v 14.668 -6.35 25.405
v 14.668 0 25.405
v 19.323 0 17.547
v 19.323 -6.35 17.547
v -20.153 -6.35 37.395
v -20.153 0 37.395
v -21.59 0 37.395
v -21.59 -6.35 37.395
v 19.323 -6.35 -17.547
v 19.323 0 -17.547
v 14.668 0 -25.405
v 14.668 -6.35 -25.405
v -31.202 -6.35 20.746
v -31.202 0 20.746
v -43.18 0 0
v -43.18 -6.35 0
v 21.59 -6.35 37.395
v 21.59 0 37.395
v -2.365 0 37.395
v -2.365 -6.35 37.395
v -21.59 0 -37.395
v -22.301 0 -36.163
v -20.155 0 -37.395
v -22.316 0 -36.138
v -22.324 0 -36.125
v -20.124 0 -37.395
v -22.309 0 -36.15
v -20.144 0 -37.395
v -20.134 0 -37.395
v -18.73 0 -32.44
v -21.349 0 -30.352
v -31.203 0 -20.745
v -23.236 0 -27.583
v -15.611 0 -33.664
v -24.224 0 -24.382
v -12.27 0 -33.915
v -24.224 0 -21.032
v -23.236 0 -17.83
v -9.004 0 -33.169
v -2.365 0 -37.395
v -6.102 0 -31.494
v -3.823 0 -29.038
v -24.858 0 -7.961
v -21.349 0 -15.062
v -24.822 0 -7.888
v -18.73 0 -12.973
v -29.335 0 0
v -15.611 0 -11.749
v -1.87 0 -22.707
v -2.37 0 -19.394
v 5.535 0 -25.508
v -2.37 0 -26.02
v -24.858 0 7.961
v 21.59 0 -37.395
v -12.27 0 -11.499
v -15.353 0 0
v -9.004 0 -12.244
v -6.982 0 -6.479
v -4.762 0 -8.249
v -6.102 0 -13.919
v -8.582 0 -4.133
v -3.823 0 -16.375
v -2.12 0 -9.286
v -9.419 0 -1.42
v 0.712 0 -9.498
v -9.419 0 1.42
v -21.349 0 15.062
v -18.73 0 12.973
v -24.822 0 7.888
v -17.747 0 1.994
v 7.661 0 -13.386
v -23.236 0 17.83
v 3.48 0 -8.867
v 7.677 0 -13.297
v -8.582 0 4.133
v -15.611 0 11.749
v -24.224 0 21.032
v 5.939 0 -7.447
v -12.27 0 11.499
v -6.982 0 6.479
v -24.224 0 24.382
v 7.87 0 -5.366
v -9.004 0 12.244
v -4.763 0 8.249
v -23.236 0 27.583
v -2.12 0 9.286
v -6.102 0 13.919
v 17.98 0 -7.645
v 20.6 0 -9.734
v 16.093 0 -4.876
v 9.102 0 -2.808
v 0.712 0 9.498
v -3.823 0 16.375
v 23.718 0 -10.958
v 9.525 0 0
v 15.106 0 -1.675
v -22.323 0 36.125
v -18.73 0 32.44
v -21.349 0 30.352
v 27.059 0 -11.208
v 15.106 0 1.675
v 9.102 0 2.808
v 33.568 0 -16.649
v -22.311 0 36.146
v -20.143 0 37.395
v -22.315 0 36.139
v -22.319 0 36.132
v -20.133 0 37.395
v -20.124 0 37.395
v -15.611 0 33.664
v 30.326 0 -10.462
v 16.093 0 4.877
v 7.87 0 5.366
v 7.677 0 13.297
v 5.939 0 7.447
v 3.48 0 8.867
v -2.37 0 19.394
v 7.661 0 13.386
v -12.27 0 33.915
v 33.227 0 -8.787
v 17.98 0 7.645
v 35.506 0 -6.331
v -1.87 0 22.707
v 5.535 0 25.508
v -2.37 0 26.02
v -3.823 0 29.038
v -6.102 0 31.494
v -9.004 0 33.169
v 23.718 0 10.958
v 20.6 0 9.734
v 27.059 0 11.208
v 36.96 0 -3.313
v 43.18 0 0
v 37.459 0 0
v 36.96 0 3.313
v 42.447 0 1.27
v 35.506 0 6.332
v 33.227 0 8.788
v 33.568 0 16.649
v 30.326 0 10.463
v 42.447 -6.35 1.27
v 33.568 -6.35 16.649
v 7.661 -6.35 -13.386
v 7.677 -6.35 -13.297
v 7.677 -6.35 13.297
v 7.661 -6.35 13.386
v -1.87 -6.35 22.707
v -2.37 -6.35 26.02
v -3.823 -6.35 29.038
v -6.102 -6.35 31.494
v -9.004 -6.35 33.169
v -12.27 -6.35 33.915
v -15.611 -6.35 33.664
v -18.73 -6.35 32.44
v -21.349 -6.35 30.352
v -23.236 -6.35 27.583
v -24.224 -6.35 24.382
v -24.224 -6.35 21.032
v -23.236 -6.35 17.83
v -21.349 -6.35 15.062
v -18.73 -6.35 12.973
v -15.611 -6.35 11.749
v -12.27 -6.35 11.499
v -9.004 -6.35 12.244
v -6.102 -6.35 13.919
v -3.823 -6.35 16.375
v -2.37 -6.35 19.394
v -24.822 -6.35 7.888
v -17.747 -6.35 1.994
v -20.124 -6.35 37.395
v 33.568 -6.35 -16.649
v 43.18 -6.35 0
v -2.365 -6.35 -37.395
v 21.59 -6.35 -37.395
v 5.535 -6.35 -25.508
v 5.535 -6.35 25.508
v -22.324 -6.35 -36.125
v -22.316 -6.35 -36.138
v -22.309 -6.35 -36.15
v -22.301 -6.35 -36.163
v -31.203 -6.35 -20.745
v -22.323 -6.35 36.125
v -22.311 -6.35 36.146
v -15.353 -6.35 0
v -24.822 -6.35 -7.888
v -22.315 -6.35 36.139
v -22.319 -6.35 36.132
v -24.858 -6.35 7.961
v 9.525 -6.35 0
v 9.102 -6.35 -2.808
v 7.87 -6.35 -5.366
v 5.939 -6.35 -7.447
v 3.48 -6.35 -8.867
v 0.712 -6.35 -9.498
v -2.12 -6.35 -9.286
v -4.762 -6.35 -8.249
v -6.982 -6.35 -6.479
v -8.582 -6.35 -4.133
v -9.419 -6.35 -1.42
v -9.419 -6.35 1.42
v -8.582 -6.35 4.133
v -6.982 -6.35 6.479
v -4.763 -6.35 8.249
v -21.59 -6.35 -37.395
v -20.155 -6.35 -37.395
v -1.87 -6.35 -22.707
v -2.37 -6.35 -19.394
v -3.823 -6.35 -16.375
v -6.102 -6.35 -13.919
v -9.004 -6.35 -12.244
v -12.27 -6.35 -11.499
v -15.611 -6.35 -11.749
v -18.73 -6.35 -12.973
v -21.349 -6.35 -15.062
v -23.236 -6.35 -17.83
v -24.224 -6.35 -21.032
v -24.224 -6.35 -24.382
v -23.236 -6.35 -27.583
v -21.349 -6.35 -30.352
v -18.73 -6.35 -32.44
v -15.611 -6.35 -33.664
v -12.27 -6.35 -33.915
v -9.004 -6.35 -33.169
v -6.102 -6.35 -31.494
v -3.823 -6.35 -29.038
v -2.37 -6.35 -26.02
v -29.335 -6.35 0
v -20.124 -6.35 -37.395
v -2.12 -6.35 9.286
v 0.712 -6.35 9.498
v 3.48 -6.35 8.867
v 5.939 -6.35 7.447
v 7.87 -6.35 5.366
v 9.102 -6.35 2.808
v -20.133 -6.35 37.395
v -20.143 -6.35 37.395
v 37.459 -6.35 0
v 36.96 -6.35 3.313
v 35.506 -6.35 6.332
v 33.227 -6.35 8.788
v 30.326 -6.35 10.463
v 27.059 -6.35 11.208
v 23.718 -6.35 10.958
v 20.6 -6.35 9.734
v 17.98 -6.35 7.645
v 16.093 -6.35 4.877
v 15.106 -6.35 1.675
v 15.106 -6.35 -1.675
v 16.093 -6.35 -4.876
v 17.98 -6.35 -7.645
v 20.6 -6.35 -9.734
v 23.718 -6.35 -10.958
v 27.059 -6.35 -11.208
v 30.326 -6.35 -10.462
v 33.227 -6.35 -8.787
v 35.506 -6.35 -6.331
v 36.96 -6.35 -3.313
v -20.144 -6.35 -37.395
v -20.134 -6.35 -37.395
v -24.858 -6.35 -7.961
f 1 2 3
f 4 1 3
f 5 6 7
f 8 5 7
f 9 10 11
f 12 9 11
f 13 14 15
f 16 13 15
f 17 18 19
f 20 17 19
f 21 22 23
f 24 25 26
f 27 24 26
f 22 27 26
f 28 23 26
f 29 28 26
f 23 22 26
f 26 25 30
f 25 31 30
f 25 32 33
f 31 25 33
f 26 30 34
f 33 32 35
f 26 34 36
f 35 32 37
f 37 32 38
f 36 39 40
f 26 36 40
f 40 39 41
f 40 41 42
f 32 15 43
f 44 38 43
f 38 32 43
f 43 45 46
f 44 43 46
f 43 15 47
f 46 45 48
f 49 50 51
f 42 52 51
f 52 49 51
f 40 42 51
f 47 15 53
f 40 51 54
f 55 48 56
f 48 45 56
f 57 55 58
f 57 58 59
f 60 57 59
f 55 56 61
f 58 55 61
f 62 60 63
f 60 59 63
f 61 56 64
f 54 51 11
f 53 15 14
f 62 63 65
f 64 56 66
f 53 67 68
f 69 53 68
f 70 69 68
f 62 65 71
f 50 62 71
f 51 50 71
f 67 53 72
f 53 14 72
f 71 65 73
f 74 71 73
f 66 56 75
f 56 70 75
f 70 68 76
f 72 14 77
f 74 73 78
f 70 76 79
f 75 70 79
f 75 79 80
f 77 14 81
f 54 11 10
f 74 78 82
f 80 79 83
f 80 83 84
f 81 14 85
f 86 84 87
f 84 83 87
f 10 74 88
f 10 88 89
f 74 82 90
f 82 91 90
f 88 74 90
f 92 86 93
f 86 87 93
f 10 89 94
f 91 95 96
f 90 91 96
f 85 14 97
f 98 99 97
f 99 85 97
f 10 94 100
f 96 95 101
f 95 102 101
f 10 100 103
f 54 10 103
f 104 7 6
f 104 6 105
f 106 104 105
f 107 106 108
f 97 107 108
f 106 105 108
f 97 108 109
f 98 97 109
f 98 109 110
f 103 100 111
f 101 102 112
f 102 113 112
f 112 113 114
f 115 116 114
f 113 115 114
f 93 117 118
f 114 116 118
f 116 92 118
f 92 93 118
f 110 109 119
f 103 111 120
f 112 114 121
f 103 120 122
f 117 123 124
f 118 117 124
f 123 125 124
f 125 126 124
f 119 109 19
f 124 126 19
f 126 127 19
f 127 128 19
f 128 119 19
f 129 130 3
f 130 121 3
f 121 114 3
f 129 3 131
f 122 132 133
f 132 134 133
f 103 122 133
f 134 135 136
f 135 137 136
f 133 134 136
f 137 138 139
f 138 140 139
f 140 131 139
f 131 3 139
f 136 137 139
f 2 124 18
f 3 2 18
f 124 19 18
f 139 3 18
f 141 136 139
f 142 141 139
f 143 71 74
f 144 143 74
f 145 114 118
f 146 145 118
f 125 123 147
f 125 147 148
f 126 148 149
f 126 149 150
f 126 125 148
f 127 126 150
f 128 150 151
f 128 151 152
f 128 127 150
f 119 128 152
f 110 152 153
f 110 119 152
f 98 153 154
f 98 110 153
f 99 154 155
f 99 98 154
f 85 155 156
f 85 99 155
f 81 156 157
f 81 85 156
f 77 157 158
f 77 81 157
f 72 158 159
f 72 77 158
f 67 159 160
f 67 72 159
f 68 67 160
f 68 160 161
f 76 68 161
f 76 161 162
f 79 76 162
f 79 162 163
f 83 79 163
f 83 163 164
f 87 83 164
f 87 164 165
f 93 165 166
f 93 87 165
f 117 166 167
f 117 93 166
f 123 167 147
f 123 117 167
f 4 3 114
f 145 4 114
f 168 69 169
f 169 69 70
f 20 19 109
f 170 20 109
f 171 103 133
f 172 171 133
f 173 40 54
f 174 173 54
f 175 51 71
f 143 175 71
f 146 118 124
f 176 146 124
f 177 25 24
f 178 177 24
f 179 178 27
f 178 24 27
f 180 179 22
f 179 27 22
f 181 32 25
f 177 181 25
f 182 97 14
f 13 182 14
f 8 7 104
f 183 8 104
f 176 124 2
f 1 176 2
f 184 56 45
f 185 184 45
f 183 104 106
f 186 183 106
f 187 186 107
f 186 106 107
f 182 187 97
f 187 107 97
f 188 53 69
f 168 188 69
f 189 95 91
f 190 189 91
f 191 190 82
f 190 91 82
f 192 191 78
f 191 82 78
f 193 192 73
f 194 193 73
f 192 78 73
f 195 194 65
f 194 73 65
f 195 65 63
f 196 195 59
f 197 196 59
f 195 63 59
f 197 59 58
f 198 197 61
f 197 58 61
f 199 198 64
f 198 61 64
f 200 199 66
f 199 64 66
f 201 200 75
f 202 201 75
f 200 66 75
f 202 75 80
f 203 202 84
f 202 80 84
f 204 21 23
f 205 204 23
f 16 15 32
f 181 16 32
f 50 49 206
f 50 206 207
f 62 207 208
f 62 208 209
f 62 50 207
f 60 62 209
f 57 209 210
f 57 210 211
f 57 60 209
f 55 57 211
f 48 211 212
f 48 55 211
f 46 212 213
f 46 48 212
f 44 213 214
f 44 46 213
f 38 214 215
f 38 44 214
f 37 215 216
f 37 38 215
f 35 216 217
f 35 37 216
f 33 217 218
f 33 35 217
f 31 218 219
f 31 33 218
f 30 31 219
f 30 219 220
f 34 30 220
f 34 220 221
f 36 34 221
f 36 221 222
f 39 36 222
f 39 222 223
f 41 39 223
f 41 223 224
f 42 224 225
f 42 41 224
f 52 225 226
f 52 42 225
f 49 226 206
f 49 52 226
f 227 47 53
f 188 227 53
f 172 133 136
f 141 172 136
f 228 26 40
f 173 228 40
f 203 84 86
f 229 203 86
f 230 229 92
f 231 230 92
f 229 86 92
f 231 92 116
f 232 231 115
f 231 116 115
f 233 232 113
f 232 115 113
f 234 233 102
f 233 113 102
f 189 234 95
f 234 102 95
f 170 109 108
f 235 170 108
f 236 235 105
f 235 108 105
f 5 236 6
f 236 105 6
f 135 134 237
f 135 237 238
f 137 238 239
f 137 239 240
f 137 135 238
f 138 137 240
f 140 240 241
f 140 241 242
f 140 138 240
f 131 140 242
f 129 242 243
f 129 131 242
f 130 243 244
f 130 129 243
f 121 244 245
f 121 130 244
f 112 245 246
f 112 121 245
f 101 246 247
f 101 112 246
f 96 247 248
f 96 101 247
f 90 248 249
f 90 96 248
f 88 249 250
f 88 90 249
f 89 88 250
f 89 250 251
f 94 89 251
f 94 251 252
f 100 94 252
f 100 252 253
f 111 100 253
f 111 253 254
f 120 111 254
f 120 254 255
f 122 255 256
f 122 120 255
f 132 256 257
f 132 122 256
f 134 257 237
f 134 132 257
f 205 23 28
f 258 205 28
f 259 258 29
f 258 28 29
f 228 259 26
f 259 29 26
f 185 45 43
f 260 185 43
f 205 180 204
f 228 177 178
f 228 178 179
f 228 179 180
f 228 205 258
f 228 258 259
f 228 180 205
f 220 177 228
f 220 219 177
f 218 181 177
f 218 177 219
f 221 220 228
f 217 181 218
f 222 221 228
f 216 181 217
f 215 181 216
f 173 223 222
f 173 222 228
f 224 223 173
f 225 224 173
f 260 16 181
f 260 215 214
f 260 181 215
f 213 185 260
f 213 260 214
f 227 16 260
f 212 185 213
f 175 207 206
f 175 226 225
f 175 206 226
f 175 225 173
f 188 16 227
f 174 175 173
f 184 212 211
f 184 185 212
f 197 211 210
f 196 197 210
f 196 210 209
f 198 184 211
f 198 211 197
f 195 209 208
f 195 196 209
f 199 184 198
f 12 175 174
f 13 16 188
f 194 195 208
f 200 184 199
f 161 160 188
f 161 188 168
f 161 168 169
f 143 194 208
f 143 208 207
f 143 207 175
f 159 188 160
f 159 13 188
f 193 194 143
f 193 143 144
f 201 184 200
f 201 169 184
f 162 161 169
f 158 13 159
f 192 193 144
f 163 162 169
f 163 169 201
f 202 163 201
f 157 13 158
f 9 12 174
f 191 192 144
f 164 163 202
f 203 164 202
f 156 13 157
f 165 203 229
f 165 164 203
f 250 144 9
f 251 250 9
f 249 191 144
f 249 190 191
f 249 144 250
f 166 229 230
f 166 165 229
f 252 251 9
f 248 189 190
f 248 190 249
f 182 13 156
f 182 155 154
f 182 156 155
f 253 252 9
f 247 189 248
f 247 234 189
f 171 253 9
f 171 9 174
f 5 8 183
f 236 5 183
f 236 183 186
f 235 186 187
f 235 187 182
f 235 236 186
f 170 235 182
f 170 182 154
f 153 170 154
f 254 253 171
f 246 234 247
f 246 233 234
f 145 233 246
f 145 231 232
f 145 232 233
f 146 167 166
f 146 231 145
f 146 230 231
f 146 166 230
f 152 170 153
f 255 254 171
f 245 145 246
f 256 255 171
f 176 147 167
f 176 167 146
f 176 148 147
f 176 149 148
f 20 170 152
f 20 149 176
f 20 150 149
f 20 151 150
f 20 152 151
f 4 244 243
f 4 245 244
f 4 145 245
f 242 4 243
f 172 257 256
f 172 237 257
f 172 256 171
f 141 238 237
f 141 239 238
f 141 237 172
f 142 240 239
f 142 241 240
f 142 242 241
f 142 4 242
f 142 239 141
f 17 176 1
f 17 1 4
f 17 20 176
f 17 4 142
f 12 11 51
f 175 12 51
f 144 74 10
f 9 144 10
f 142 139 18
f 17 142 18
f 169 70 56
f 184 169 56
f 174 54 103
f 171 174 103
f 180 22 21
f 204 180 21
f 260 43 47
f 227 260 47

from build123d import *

# Parameters (mm, degrees)
F0_R     = 11.2395
F1_DEPTH = 6.35


# Not quite as in the source:
# - ends of sketch curves that miss each other by under 0.0002 mm in the source are joined


with BuildPart() as f1:
    # F0 (on Front) → F1 (new body)
    with BuildSketch(Plane.XZ):
        with BuildLine():
            Line((42.4466417494, 1.2702137502), (33.5675281941, 16.6492895541))
            Line((33.5675281941, 16.6492895541), (21.59, 37.3949769354))
            Line((21.59, 37.3949769354), (-2.3645964913, 37.3949769354))
            Line((-2.3645964913, 37.3949769354), (-20.1530883691, 37.3949769354))
            ThreePointArc((-20.1530883691, 37.3949769354), (-21.3957267903, 37.0536052726), (-22.3109030797, 36.1463361741))
            Line((-22.3109030797, 36.1463361741), (-31.2024712814, 20.7456882897))
            Line((-31.2024712814, 20.7456882897), (-43.18, 0))
            Line((-43.18, 0), (-31.2026751276, -20.7453352178))
            Line((-31.2026751276, -20.7453352178), (-22.3013335195, -36.1629111385))
            ThreePointArc((-22.3013335195, -36.1629111385), (-21.904358157, -36.6666327955), (-21.3938662061, -37.0548632868))
            ThreePointArc((-21.3938662061, -37.0548632868), (-20.7960911396, -37.3045921602), (-20.1545849957, -37.3949769354))
            Line((-20.1545849957, -37.3949769354), (-2.3645964913, -37.3949769354))
            Line((-2.3645964913, -37.3949769354), (21.59, -37.3949769354))
            Line((21.59, -37.3949769354), (33.5675281941, -16.6492895541))
            Line((33.5675281941, -16.6492895541), (42.4465800457, -1.269893127))
            Line((42.4465800457, -1.269893127), (42.4466570355, -1.2697597731))
            ThreePointArc((42.4466570355, -1.2697597731), (42.7869372237, 0.0002290365), (42.4466417494, 1.2702137502))
        make_face()
        with Locations((-13.1097560234, -22.7067635073)):
            Circle(F0_R, mode=Mode.SUBTRACT)
        Polygon((19.322999251, -17.547366104), (14.6677320258, -25.4052571005), (5.5348901331, -25.5078921242), (7.6610986638, -13.3857599047), (7.676716044, -13.2967206855), align=None, mode=Mode.SUBTRACT)
        Polygon((-15.3534299541, -0.0001902285), (-24.8221534826, -7.8882218978), (-24.8579644411, -7.9605251767), (-29.3354640516, 0), (-24.8579276431, 7.9605905996), (-24.8220816566, 7.8883561733), (-17.7474034479, 1.9942828585), align=None, mode=Mode.SUBTRACT)
        with Locations((-13.1097560234, 22.7067635073)):
            Circle(F0_R, mode=Mode.SUBTRACT)
        with BuildLine():
            ThreePointArc((-4.7625, 8.248891971), (4.7625, 8.248891971), (9.525, 0))
            ThreePointArc((9.525, 0), (-4.7625, -8.248891971), (-4.7625, 8.248891971))
        make_face(mode=Mode.SUBTRACT)
        with Locations((26.2195120463, 0.0001612286)):
            Circle(F0_R, mode=Mode.SUBTRACT)
        Polygon((5.5348901331, 25.5078921242), (14.6677320258, 25.4052571005), (19.322999251, 17.547366104), (7.676716044, 13.2967206855), (7.6610986638, 13.3857599047), align=None, mode=Mode.SUBTRACT)
        with BuildLine():
            Line((43.18, 0), (42.4466417494, 1.2702137502))
            ThreePointArc((42.4466417494, 1.2702137502), (42.7869372237, 0.0002290365), (42.4466570355, -1.2697597731))
            Line((42.4466570355, -1.2697597731), (42.4465800457, -1.269893127))
            Line((42.4465800457, -1.269893127), (33.5675281941, -16.6492895541))
            Line((33.5675281941, -16.6492895541), (43.18, 0))
        make_face()
        with BuildLine():
            Line((-20.1530883691, 37.3949769354), (-2.3645964913, 37.3949769354))
            Line((-2.3645964913, 37.3949769354), (-20.1235435545, 37.3951484857))
            ThreePointArc((-20.1235435545, 37.3951484857), (-20.1383162113, 37.3951056691), (-20.1530883691, 37.3949769354))
        make_face()
        with BuildLine():
            ThreePointArc((-22.3109030797, 36.1463361741), (-21.3957267903, 37.0536052726), (-20.1530883691, 37.3949769354))
            Line((-20.1530883691, 37.3949769354), (-21.59, 37.3949769354))
            Line((-21.59, 37.3949769354), (-22.3109030797, 36.1463361741))
        make_face()
        with BuildLine():
            Line((-31.2024712814, 20.7456882897), (-22.3109030797, 36.1463361741))
            ThreePointArc((-22.3109030797, 36.1463361741), (-22.3171177275, 36.1357499036), (-22.3232811402, 36.125133722))
            Line((-22.3232811402, 36.125133722), (-31.2024712814, 20.7456882897))
        make_face()
        with BuildLine():
            Line((-20.1238326592, -37.395162783), (-2.3645964913, -37.3949769354))
            Line((-2.3645964913, -37.3949769354), (-20.1545849957, -37.3949769354))
            ThreePointArc((-20.1545849957, -37.3949769354), (-20.1392091087, -37.3951164012), (-20.1238326592, -37.395162783))
        make_face()
        with BuildLine():
            Line((-21.59, -37.3949769354), (-20.1545849957, -37.3949769354))
            ThreePointArc((-20.1545849957, -37.3949769354), (-20.7960911396, -37.3045921602), (-21.3938662061, -37.0548632868))
            Line((-21.3938662061, -37.0548632868), (-21.590116174, -37.3947757161))
            Line((-21.590116174, -37.3947757161), (-21.59, -37.3949769354))
        make_face()
        with BuildLine():
            Line((-21.590116174, -37.3947757161), (-21.3938662061, -37.0548632868))
            ThreePointArc((-21.3938662061, -37.0548632868), (-21.904358157, -36.6666327955), (-22.3013335195, -36.1629111385))
            Line((-22.3013335195, -36.1629111385), (-21.590116174, -37.3947757161))
        make_face()
        with BuildLine():
            Line((-22.3013335195, -36.1629111385), (-31.2026751276, -20.7453352178))
            Line((-31.2026751276, -20.7453352178), (-22.3235850993, -36.1251258309))
            ThreePointArc((-22.3235850993, -36.1251258309), (-22.3125408514, -36.1440665044), (-22.3013335195, -36.1629111385))
        make_face()
    extrude(amount=F1_DEPTH)


solid = f1.part
